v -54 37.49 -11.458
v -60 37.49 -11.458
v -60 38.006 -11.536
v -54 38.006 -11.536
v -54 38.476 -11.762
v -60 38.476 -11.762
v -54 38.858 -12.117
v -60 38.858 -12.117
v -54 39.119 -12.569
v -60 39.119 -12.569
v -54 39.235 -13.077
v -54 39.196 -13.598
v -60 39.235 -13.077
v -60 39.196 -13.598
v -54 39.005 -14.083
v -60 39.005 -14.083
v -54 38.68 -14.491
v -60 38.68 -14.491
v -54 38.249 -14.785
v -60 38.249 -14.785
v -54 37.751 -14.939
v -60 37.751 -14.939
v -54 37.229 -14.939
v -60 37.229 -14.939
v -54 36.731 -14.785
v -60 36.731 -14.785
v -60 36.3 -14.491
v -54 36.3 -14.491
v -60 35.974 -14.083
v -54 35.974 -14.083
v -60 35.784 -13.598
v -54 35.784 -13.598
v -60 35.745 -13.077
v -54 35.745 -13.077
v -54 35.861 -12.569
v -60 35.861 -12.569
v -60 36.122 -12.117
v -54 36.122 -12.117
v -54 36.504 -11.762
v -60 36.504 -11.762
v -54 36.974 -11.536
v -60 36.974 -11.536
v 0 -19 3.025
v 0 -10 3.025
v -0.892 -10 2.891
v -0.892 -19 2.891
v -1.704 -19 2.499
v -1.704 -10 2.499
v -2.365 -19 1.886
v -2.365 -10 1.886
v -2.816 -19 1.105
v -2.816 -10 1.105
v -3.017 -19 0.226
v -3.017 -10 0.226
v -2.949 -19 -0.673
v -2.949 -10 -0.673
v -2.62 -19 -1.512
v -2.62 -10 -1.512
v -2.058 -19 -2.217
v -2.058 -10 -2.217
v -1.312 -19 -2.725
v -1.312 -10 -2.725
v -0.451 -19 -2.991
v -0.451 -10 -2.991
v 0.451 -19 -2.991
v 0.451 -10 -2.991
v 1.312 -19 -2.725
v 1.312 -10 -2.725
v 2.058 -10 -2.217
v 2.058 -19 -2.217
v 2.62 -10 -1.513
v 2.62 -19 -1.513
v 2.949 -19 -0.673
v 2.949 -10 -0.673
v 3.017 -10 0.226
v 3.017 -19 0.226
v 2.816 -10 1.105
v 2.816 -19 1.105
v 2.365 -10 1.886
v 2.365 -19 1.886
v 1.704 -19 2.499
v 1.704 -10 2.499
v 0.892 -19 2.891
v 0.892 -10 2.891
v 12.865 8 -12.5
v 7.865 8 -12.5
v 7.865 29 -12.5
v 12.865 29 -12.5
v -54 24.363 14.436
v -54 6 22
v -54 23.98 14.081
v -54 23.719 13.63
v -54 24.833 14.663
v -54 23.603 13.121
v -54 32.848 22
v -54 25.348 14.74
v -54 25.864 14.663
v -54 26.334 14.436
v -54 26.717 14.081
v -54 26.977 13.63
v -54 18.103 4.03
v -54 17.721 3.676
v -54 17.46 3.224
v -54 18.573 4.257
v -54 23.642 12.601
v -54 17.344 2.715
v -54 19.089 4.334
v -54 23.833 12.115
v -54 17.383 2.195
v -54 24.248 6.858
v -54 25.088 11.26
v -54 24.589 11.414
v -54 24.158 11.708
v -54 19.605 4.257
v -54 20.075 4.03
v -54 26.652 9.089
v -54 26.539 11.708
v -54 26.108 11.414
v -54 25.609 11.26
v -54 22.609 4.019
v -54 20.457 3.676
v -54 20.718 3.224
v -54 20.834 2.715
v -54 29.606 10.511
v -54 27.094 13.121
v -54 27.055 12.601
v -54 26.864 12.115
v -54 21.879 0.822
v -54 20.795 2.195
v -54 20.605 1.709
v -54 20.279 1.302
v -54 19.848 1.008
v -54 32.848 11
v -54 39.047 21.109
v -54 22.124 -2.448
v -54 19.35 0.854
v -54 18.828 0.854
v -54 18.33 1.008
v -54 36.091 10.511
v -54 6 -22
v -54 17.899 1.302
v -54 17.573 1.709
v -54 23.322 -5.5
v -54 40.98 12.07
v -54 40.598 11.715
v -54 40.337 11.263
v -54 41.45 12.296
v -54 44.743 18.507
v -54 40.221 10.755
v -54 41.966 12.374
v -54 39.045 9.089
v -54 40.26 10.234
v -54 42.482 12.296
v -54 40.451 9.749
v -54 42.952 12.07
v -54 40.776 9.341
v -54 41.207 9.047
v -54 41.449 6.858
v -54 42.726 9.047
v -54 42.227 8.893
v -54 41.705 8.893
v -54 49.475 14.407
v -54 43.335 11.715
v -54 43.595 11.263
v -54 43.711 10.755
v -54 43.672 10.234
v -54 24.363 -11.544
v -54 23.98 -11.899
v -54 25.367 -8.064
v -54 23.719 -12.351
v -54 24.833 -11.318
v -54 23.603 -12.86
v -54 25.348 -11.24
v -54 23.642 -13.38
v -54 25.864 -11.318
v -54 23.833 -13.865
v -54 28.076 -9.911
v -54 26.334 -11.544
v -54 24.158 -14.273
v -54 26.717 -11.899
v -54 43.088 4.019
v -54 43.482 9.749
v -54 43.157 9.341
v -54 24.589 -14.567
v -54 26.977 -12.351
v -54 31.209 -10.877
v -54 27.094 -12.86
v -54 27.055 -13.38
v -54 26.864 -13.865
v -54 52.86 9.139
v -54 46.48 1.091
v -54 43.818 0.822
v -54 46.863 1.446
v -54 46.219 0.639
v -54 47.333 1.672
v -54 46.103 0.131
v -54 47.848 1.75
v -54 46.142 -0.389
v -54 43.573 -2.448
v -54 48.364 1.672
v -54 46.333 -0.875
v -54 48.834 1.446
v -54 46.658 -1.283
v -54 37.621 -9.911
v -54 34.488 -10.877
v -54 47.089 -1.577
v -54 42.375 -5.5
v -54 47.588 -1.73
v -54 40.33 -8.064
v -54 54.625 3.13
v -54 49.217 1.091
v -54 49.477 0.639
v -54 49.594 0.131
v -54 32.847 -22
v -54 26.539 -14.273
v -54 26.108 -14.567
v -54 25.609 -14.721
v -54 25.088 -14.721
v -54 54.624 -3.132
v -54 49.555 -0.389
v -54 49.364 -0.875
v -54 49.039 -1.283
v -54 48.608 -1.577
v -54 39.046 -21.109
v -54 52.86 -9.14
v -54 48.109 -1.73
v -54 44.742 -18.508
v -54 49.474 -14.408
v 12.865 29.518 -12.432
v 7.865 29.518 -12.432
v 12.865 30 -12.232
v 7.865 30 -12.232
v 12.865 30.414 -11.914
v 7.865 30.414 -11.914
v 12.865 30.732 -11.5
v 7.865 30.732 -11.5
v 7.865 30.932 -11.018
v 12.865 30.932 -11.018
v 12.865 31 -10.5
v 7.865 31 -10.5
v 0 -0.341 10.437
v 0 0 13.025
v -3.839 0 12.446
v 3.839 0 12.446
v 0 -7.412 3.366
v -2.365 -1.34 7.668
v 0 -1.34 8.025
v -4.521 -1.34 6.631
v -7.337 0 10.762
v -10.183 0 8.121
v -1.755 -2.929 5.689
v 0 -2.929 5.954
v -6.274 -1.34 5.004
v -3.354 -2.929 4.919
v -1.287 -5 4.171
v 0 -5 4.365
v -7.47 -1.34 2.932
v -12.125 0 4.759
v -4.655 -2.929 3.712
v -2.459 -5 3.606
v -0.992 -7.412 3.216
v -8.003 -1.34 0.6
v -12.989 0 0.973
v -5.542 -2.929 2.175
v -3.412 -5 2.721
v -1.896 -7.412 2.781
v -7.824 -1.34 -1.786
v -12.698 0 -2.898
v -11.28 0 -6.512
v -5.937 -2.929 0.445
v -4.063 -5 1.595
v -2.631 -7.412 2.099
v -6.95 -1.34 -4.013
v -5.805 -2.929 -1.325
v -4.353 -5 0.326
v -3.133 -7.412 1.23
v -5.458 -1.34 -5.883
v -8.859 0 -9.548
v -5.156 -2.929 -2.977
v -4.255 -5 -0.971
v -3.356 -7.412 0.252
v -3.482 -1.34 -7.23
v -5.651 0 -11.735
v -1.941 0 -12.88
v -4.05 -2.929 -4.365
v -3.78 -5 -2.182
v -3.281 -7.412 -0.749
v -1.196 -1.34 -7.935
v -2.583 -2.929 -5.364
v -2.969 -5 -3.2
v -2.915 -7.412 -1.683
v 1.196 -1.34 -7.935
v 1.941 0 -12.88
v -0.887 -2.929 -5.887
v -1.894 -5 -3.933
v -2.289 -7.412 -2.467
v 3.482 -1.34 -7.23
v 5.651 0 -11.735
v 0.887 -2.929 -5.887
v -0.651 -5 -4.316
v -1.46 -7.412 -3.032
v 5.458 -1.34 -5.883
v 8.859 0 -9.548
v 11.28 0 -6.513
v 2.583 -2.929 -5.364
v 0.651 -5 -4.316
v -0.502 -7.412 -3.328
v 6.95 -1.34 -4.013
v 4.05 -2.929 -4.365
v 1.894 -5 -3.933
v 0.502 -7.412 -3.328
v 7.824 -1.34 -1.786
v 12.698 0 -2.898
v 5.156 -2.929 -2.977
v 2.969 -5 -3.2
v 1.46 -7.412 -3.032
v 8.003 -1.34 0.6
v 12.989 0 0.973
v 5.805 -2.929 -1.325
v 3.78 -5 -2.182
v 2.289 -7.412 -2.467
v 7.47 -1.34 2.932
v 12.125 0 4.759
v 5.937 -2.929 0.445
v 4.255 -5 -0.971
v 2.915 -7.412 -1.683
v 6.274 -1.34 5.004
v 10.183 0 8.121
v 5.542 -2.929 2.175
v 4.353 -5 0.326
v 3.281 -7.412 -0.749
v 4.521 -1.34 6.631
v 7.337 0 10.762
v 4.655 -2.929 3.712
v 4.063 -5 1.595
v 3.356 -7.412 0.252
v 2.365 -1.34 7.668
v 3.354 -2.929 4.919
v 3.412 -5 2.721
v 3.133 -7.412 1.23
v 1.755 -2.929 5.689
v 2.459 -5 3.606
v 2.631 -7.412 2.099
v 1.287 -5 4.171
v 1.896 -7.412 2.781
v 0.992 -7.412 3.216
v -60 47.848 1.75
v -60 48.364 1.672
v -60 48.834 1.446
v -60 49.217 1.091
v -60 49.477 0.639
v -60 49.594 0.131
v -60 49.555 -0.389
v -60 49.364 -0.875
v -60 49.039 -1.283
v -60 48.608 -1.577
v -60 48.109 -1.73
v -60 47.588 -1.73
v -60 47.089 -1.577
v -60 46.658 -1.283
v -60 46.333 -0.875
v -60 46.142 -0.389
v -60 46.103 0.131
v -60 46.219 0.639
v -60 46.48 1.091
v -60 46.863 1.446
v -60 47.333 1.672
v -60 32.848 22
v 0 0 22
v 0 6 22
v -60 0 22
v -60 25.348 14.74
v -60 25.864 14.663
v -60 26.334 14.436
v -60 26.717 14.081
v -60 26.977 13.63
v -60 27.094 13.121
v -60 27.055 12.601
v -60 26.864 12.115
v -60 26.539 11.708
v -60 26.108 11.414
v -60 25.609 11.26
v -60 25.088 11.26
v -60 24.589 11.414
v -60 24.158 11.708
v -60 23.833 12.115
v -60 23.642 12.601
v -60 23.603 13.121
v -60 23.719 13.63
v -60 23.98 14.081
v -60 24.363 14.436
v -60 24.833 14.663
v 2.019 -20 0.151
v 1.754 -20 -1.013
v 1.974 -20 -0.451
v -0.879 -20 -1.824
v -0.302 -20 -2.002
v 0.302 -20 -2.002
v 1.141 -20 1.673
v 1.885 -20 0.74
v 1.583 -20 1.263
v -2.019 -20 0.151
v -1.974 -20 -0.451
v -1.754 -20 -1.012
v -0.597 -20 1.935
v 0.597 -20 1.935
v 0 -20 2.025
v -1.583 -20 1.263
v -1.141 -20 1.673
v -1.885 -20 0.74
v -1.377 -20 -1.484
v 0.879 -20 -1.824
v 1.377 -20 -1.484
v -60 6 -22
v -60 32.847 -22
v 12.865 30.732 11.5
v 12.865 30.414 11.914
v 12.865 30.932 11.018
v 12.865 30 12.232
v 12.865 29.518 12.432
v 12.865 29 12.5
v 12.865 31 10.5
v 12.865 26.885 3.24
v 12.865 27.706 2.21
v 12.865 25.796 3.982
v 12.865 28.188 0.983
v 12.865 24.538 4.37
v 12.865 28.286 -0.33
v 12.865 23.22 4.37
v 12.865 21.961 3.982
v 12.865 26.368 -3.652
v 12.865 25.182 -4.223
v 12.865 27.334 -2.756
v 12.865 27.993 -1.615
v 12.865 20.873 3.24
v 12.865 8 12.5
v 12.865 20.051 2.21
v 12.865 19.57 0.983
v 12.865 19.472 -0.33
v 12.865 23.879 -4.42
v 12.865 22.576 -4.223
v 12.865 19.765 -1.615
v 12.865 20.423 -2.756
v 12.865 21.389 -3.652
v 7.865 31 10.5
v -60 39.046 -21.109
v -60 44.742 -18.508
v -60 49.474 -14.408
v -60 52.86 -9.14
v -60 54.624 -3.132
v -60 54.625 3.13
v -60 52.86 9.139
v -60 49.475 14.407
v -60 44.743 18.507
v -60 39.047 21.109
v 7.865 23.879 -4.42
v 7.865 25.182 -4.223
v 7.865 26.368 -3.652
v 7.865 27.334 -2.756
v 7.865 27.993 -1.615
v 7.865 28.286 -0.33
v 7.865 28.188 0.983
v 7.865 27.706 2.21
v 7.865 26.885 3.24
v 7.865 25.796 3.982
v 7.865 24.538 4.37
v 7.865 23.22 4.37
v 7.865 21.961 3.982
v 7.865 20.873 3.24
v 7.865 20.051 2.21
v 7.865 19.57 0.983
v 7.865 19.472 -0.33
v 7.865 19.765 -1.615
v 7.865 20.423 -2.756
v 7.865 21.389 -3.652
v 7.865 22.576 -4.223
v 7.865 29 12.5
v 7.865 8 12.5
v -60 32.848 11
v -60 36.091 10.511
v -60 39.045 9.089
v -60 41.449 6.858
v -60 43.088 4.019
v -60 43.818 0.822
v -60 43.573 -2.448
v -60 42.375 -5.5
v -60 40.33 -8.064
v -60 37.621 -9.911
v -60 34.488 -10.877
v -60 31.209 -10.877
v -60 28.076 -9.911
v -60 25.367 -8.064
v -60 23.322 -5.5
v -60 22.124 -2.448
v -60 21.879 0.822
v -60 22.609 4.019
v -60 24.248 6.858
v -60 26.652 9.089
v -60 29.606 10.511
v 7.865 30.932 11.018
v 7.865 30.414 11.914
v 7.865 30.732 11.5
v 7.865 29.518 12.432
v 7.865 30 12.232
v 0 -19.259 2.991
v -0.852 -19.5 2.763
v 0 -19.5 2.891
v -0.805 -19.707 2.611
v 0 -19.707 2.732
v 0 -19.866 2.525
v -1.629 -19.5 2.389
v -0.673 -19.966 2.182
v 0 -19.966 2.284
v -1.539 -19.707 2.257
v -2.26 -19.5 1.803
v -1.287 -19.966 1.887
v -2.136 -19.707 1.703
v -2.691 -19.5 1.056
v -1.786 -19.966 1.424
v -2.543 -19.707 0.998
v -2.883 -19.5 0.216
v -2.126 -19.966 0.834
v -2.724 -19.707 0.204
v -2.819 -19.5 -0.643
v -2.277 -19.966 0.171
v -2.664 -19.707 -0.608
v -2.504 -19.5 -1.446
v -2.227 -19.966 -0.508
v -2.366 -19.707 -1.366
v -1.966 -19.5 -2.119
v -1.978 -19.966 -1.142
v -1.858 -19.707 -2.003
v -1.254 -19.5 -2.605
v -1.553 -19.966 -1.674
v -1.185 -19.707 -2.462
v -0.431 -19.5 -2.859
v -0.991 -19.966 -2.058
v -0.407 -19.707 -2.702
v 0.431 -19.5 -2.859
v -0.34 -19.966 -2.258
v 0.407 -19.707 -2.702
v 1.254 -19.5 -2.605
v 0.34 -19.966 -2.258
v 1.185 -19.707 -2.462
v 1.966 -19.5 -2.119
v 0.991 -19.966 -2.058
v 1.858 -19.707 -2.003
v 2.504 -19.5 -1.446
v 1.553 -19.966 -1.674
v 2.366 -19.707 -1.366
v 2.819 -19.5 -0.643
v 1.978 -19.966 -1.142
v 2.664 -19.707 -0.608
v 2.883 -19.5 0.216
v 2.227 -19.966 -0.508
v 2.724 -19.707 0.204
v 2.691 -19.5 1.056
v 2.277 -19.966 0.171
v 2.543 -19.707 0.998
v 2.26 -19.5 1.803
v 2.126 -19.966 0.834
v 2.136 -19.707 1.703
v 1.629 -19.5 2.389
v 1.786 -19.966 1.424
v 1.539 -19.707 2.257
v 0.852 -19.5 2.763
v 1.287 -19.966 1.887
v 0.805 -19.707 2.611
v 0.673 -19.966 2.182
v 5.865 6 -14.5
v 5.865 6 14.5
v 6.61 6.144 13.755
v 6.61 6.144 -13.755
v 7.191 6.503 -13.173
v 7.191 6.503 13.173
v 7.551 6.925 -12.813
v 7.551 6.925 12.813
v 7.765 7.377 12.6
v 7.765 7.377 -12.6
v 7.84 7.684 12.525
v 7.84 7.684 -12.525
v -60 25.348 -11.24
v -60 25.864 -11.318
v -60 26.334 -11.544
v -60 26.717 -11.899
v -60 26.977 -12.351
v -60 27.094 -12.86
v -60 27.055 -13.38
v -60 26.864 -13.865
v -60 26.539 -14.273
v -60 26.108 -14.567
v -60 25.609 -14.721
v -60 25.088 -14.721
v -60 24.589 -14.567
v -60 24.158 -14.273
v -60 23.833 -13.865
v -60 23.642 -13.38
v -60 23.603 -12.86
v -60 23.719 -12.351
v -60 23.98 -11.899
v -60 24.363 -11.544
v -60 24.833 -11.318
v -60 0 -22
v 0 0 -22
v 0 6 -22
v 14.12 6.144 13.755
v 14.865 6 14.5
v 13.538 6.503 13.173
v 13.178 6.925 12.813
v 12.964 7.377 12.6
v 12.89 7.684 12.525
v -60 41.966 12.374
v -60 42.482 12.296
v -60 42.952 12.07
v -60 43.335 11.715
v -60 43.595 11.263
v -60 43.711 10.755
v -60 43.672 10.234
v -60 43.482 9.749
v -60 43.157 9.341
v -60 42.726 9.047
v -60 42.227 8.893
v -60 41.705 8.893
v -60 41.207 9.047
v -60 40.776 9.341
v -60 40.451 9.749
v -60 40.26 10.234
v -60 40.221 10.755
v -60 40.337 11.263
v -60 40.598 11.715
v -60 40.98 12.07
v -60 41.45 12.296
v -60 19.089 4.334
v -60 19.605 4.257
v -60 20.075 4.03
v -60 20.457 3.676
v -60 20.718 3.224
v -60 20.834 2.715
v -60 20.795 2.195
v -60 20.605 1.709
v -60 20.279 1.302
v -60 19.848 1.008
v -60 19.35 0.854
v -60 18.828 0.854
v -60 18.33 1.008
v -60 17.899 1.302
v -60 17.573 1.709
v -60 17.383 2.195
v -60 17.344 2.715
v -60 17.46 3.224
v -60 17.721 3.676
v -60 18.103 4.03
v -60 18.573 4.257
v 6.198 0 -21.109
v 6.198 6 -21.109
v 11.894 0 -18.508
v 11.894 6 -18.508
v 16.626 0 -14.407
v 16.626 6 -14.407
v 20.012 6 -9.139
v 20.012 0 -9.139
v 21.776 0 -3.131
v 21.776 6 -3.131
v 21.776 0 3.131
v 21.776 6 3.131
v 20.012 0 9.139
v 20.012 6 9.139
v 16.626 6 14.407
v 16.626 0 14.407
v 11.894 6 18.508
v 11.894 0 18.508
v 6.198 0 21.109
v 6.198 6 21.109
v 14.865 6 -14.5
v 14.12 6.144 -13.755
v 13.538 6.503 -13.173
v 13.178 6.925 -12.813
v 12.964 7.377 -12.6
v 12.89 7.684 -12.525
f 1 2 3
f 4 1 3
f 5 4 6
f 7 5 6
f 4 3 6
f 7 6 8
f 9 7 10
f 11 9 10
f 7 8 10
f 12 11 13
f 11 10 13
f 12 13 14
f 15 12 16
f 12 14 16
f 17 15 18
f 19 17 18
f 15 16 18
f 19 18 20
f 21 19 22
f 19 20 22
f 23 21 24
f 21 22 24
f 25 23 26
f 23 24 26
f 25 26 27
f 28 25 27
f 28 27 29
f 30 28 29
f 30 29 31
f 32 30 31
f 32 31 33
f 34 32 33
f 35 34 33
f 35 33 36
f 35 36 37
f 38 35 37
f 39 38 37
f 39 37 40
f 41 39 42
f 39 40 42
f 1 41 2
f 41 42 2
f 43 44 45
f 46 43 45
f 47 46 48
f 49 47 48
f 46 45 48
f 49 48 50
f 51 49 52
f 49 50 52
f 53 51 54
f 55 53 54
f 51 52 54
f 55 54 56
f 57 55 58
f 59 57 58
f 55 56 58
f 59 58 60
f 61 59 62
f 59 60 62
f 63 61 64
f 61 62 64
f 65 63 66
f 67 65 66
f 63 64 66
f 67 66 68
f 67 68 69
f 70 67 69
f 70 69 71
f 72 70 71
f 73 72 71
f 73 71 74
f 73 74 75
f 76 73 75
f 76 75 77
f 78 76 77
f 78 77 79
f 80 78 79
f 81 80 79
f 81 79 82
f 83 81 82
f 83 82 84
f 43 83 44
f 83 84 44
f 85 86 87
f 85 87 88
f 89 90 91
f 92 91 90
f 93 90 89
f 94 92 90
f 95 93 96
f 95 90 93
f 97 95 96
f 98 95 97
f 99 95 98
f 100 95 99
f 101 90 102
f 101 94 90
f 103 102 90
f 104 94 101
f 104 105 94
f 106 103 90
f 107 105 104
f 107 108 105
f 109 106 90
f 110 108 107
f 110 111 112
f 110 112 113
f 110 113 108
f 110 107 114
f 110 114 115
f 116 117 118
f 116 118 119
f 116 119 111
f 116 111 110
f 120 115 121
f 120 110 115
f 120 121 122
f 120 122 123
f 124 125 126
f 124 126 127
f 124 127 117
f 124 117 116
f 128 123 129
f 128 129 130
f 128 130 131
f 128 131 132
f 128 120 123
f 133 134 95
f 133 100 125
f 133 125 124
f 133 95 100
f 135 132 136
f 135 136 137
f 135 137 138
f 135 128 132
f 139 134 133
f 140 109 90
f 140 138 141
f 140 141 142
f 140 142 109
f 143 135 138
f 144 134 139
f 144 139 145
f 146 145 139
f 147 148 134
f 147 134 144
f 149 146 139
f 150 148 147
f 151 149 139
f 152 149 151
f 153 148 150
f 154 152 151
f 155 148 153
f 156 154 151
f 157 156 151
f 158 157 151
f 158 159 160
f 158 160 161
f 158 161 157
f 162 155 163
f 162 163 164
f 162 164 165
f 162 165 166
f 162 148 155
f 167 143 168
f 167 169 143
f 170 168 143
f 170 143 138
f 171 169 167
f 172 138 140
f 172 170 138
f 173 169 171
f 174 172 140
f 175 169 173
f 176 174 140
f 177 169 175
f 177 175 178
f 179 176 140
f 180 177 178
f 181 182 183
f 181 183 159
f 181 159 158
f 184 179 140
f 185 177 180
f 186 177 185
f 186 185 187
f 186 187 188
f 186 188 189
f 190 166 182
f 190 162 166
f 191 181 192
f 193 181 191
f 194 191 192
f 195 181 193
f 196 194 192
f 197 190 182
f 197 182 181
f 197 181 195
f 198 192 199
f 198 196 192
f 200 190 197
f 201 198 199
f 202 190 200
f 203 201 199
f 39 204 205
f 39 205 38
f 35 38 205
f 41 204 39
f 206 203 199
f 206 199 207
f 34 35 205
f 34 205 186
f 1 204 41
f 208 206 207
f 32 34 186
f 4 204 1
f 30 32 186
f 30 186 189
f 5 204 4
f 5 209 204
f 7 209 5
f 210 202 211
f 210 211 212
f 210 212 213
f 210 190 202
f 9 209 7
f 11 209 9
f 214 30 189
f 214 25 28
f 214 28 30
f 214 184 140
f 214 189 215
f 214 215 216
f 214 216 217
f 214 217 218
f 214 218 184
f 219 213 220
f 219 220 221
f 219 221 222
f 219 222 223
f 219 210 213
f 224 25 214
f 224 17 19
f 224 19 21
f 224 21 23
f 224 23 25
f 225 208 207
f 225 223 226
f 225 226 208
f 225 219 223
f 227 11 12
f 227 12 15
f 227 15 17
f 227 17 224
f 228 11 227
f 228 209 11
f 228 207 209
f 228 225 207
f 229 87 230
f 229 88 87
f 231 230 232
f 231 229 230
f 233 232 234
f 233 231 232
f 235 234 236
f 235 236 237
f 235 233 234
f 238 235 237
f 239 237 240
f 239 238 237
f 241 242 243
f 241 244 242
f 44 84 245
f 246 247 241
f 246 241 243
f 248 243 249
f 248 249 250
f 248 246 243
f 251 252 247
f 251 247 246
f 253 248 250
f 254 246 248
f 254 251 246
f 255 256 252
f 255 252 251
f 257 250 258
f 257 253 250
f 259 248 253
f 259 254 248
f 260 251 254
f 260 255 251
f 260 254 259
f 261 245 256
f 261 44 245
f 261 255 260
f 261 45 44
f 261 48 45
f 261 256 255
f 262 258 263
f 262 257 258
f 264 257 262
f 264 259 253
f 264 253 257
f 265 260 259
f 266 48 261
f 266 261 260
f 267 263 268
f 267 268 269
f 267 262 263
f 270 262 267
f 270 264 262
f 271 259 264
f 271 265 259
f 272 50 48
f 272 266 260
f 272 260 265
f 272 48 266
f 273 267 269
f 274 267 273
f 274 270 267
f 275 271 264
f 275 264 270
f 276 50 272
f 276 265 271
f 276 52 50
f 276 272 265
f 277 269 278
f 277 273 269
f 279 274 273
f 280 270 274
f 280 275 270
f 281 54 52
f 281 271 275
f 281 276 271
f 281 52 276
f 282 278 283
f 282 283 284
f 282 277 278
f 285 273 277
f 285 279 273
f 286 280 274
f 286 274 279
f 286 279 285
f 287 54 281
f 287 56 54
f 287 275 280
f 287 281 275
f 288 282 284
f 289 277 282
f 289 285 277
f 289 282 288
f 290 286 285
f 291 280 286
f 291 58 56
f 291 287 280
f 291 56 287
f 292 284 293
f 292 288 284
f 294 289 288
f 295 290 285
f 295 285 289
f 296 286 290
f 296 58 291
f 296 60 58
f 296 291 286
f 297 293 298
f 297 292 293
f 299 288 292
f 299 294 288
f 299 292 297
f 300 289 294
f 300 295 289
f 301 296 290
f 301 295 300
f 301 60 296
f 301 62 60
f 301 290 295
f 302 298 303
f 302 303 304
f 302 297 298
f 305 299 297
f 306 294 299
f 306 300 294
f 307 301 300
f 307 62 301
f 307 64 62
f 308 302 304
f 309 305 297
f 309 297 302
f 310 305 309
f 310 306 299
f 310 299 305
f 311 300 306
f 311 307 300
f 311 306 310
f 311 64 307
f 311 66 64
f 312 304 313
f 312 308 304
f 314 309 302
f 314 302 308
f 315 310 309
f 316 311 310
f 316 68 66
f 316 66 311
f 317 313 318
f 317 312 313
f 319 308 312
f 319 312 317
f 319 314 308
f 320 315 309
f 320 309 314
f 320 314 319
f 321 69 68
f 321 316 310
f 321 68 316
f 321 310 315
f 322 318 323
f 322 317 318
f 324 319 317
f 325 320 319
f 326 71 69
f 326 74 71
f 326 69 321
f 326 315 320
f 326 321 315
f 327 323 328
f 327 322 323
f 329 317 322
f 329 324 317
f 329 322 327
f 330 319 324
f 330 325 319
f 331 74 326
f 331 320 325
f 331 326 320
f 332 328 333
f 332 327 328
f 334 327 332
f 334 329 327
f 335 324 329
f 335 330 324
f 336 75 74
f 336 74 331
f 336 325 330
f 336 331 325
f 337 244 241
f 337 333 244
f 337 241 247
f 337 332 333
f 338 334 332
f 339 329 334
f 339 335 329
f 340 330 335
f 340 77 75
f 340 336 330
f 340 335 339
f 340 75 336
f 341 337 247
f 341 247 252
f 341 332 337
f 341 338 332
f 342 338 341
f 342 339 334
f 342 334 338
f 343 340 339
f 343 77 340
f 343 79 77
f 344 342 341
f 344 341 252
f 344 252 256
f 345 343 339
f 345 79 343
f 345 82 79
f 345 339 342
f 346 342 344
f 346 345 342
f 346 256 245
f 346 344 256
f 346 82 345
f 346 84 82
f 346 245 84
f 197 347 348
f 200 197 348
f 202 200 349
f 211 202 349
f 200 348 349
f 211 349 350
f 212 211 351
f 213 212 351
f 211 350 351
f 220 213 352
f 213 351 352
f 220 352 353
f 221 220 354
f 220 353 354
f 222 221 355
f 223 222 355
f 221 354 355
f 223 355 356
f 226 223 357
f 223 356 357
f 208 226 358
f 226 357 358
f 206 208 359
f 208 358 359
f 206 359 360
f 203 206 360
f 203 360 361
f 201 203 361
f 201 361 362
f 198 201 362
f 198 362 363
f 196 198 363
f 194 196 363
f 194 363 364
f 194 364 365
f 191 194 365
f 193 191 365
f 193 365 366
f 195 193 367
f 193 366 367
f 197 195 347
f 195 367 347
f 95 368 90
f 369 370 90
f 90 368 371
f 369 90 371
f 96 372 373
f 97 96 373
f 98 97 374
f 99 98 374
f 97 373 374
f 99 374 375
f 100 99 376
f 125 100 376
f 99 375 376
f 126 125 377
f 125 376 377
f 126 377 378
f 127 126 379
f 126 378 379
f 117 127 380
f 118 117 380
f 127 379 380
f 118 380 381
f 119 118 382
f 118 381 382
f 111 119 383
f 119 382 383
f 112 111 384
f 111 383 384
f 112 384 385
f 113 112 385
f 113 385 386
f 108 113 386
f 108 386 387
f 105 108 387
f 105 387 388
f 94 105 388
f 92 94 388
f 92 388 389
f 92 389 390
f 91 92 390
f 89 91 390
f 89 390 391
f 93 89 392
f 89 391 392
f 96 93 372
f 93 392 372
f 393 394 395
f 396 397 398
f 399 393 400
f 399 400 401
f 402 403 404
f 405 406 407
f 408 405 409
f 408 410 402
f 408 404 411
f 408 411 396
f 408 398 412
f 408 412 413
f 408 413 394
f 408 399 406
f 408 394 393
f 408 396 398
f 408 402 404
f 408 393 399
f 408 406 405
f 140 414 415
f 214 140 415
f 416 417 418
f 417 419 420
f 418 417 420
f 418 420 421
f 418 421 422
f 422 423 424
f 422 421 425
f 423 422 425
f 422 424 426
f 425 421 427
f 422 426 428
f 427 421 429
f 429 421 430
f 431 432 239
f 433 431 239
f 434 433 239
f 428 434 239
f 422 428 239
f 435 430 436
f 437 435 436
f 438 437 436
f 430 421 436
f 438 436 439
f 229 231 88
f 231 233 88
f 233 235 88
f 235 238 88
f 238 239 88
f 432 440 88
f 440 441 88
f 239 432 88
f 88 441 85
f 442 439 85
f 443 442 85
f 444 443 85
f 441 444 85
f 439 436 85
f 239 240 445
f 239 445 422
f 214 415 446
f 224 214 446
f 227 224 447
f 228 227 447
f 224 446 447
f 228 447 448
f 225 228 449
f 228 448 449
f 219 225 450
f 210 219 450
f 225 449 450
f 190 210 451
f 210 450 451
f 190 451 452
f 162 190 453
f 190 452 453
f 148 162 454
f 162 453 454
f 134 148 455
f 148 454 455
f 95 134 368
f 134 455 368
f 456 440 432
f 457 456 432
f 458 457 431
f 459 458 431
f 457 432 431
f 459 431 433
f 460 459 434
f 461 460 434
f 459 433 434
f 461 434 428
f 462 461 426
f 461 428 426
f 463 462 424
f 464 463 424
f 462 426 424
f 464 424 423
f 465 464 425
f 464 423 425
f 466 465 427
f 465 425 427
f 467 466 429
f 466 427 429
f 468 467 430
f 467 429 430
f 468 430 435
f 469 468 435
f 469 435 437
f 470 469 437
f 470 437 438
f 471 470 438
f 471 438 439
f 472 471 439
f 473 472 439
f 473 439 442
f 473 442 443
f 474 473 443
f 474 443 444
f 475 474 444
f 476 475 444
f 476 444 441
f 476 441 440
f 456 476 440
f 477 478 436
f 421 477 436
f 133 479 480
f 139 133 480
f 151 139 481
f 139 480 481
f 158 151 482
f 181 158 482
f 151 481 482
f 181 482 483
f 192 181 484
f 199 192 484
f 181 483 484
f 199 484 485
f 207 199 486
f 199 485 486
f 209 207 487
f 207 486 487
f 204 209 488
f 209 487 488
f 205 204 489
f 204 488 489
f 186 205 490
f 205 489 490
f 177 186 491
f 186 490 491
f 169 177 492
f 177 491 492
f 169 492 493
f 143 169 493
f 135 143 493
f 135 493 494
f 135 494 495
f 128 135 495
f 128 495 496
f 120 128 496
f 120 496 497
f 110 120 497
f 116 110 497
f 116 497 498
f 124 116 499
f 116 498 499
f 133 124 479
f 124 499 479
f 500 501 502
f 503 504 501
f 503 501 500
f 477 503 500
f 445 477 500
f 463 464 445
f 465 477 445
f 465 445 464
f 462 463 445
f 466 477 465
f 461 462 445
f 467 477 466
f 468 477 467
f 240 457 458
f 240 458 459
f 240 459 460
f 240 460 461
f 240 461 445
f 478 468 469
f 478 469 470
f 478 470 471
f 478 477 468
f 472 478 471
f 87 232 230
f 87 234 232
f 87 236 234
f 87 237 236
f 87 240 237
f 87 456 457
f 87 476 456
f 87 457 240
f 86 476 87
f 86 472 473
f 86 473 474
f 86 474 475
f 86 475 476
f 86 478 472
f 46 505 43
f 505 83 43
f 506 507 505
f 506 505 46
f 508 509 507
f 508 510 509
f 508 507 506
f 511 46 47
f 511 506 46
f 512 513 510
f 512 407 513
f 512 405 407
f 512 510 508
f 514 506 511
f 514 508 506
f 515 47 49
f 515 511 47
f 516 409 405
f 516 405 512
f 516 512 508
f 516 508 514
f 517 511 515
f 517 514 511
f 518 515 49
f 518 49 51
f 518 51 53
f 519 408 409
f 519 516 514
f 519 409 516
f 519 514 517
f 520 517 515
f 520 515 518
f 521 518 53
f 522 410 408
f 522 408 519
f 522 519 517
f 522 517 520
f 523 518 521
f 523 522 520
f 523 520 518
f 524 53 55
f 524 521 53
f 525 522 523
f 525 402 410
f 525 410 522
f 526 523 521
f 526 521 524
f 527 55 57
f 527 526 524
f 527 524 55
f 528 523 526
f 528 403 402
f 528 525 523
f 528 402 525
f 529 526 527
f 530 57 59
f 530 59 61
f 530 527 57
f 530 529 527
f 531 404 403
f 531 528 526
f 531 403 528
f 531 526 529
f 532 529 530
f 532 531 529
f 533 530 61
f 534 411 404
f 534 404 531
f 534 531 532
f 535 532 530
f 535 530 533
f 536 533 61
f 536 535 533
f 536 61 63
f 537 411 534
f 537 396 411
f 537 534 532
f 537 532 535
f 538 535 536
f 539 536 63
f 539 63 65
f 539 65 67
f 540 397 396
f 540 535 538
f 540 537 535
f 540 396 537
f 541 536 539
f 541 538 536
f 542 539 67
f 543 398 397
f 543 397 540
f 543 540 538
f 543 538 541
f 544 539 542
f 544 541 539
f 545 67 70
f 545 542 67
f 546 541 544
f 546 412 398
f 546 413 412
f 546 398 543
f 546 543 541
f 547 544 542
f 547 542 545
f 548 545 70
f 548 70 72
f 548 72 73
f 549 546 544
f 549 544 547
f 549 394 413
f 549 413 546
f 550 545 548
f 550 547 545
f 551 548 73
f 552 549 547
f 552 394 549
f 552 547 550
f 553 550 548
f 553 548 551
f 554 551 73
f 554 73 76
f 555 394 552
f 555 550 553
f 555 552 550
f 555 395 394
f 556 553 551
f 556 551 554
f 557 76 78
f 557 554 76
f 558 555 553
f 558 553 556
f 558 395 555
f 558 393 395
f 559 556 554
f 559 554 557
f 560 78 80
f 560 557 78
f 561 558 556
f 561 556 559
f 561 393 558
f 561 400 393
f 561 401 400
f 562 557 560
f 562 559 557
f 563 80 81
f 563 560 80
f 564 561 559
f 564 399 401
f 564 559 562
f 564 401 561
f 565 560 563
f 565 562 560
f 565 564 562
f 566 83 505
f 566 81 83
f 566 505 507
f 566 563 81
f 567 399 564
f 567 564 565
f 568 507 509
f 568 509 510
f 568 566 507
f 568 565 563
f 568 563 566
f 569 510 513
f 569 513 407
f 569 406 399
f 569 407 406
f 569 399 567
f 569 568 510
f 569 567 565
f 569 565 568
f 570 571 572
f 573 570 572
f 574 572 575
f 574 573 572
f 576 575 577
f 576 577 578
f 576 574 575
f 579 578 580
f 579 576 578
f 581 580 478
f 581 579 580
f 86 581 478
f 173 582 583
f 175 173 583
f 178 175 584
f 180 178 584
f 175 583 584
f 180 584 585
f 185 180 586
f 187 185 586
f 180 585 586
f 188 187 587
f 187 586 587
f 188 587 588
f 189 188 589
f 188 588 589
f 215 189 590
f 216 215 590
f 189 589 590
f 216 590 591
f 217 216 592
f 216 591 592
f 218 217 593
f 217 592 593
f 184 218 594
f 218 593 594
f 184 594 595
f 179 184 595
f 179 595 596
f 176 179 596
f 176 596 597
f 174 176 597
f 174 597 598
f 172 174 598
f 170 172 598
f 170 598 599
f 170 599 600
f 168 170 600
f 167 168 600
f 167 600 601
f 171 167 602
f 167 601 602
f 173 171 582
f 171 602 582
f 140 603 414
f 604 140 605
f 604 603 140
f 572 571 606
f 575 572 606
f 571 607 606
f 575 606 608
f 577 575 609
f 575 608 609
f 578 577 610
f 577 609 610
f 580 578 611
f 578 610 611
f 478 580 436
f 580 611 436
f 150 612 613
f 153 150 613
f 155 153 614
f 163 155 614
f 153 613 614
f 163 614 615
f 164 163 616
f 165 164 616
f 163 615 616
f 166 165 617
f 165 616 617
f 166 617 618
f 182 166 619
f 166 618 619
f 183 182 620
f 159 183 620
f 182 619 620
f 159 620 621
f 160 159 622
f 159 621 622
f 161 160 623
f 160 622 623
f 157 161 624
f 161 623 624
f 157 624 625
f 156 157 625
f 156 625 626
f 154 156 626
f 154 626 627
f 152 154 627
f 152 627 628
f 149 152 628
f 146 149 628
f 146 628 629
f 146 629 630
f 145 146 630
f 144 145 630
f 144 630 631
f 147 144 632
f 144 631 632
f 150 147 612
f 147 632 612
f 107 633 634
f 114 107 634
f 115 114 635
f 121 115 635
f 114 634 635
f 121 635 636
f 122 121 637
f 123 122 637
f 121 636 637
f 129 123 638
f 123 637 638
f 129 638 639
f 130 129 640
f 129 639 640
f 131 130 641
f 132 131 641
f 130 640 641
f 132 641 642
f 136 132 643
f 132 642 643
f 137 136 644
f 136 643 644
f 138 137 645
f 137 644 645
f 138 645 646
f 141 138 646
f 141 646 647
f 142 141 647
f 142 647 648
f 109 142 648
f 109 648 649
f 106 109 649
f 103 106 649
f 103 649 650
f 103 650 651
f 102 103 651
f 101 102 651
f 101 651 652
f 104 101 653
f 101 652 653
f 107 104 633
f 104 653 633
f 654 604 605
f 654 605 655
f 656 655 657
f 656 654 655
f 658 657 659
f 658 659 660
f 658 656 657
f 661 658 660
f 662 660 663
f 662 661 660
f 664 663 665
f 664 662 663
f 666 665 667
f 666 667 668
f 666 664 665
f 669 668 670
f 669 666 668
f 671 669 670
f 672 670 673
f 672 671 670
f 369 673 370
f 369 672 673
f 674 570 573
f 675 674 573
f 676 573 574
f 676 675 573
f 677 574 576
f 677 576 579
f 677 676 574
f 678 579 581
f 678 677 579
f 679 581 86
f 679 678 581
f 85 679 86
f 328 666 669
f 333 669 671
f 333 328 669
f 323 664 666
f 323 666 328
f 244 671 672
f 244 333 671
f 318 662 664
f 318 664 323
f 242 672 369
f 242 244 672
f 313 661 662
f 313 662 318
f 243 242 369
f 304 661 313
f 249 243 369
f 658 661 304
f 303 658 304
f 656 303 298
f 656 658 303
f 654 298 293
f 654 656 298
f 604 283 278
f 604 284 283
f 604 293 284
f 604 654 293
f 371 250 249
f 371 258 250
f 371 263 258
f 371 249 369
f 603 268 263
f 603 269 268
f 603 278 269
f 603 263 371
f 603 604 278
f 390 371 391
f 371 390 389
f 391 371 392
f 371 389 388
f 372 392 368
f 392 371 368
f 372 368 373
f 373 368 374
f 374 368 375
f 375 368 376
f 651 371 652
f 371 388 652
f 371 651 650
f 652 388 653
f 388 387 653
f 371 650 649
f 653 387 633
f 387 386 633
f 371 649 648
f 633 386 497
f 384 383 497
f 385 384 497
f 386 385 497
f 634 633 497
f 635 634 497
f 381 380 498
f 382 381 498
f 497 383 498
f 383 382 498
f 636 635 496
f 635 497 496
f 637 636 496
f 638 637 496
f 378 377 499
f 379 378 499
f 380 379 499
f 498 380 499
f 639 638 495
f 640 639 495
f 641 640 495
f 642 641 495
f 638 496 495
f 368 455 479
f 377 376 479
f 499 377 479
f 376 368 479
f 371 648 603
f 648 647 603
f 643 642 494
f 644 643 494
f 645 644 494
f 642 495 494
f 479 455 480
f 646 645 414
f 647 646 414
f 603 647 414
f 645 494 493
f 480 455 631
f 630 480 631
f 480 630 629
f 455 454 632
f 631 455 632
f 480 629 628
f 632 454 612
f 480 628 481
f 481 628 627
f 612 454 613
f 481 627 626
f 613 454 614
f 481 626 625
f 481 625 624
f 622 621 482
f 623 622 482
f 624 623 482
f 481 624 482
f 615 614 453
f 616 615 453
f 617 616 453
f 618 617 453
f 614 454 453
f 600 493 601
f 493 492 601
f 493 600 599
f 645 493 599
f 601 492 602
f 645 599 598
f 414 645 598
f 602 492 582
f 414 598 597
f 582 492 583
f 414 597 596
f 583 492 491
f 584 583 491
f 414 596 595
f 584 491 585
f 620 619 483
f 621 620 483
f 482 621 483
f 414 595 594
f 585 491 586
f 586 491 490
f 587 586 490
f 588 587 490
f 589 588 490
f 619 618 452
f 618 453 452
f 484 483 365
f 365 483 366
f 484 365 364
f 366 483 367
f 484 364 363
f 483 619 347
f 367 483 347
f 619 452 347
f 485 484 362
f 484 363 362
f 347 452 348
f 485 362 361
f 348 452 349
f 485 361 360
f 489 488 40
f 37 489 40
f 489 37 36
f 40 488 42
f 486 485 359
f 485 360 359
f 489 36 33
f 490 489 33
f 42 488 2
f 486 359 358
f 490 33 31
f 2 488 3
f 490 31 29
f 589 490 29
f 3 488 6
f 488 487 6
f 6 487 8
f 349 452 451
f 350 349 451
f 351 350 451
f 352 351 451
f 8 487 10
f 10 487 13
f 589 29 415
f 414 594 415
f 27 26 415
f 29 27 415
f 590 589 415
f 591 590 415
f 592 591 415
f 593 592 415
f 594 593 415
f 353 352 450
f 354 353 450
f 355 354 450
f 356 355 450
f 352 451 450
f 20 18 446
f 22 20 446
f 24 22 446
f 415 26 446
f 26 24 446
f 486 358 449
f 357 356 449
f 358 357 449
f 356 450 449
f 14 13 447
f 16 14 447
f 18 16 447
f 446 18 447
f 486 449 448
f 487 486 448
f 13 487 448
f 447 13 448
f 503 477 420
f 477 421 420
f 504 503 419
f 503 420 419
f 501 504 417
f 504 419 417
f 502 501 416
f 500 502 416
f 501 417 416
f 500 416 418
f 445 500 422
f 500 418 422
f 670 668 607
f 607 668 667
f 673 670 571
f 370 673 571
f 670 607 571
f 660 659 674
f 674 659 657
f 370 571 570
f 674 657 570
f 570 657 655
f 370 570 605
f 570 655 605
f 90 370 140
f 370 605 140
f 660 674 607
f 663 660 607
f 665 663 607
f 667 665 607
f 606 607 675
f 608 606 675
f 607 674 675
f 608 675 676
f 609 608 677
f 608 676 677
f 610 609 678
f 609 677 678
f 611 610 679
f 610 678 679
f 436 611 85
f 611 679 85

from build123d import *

# Parameters (mm, degrees)
BOSS_EXTRUDE1_DEPTH = 6
BOSS_EXTRUDE2_DEPTH = 6
SKETCH3_R           = 11
SKETCH3_R_2         = 1.75
CUT_EXTRUDE1_DEPTH  = 6
SKETCH4_R           = 3.025
BOSS_EXTRUDE3_DEPTH = 20
FILLET1_R           = 10
FILLET2_R           = 1
SKETCH5_W           = 5
SKETCH5_H           = 25
BOSS_EXTRUDE4_DEPTH = 25
CUT_EXTRUDE2_REACH  = 95.817
SKETCH6_R           = 4.419567015
FILLET3_R           = 2


with BuildPart() as part:
    # Sketch1 → Boss-Extrude1 (new body)
    with BuildSketch(Plane(origin=(0, 0, 0), x_dir=(1, 0, 0), z_dir=(0, 1, 0))):
        with BuildLine():
            Line((0, -22), (-60, -22))
            Line((-60, -22), (-60, 22))
            Line((-60, 22), (0, 22))
            ThreePointArc((0, 22), (22, 0), (0, -22))
        make_face()
    extrude(amount=BOSS_EXTRUDE1_DEPTH)

    # Sketch2 → Boss-Extrude2 (add)
    with BuildSketch(Plane.ZY.offset(60)):
        with BuildLine():
            Line((-22, 6), (-21.999999972, 32.847291098))
            ThreePointArc((-21.999999972, 32.847291098), (-0.000557287, 54.848405664), (22, 32.848405671))
            Line((22, 32.848405671), (22, 6))
            Line((22, 6), (-22, 6))
        make_face()
    extrude(amount=-BOSS_EXTRUDE2_DEPTH)

    # Sketch3 → Cut-Extrude1 (cut)
    with BuildSketch(Plane.ZY.offset(60)):
        with Locations((0, 32.848405671)):
            Circle(SKETCH3_R)
        with Locations((0, 47.848405671)):
            Circle(SKETCH3_R_2)
        with Locations((12.990381057, 25.348405671)):
            Circle(SKETCH3_R_2)
        with Locations((-12.990381057, 25.348405671)):
            Circle(SKETCH3_R_2)
        with Locations((10.623744158, 41.966303458)):
            Circle(SKETCH3_R_2)
        with Locations((2.584459033, 19.089024453)):
            Circle(SKETCH3_R_2)
        with Locations((-13.208203192, 37.489889102)):
            Circle(SKETCH3_R_2)
    extrude(amount=-CUT_EXTRUDE1_DEPTH, mode=Mode.SUBTRACT)

    # Sketch4 → Boss-Extrude3 (add)
    with BuildSketch(Plane.XZ):
        with Locations(Location((0, 0, 0), (0, 0, 90))):
            Circle(SKETCH4_R)
    extrude(amount=BOSS_EXTRUDE3_DEPTH)

    # Fillet1
    fillet1_edges = [part.edges().sort_by_distance(p)[0] for p in [
        (0, 0, -3.025),
    ]]
    fillet(fillet1_edges, radius=FILLET1_R)

    # Fillet2
    fillet2_edges = [part.edges().sort_by_distance(p)[0] for p in [
        (0, -20, -3.025),
    ]]
    fillet(fillet2_edges, radius=FILLET2_R)

    # Sketch5 → Boss-Extrude4 (add)
    with BuildSketch(Plane(origin=(0, 6, 0), x_dir=(1, 0, 0), z_dir=(0, 1, 0))):
        with Locations((10.364576522, 0)):
            Rectangle(SKETCH5_W, SKETCH5_H)
    extrude(amount=BOSS_EXTRUDE4_DEPTH)

    # Sketch6 → Cut-Extrude2 (cut, up to next)
    with BuildSketch(Plane(origin=(12.864576522, 0, 0), x_dir=(0, 0, -1), z_dir=(1, 0, 0)), mode=Mode.PRIVATE) as cut_extrude2_sk1:
        with Locations((0, 23.878810585)):
            Circle(SKETCH6_R)
    cut_extrude2_tool1 = extrude(cut_extrude2_sk1.sketch, amount=-CUT_EXTRUDE2_REACH, mode=Mode.PRIVATE) & part.part
    add(cut_extrude2_tool1.solids().sort_by_distance((12.864577, 23.878811, 0))[0], mode=Mode.SUBTRACT)

    # Fillet3
    fillet3_edges = [part.edges().sort_by_distance(p)[0] for p in [
        (12.864576522, 6, 0),
        (10.364576522, 6, -12.5),
        (7.864576522, 6, 0),
        (10.364576522, 6, 12.5),
        (10.364576522, 31, -12.5),
        (10.364576522, 31, 12.5),
    ]]
    fillet(fillet3_edges, radius=FILLET3_R)


solid = part.part
